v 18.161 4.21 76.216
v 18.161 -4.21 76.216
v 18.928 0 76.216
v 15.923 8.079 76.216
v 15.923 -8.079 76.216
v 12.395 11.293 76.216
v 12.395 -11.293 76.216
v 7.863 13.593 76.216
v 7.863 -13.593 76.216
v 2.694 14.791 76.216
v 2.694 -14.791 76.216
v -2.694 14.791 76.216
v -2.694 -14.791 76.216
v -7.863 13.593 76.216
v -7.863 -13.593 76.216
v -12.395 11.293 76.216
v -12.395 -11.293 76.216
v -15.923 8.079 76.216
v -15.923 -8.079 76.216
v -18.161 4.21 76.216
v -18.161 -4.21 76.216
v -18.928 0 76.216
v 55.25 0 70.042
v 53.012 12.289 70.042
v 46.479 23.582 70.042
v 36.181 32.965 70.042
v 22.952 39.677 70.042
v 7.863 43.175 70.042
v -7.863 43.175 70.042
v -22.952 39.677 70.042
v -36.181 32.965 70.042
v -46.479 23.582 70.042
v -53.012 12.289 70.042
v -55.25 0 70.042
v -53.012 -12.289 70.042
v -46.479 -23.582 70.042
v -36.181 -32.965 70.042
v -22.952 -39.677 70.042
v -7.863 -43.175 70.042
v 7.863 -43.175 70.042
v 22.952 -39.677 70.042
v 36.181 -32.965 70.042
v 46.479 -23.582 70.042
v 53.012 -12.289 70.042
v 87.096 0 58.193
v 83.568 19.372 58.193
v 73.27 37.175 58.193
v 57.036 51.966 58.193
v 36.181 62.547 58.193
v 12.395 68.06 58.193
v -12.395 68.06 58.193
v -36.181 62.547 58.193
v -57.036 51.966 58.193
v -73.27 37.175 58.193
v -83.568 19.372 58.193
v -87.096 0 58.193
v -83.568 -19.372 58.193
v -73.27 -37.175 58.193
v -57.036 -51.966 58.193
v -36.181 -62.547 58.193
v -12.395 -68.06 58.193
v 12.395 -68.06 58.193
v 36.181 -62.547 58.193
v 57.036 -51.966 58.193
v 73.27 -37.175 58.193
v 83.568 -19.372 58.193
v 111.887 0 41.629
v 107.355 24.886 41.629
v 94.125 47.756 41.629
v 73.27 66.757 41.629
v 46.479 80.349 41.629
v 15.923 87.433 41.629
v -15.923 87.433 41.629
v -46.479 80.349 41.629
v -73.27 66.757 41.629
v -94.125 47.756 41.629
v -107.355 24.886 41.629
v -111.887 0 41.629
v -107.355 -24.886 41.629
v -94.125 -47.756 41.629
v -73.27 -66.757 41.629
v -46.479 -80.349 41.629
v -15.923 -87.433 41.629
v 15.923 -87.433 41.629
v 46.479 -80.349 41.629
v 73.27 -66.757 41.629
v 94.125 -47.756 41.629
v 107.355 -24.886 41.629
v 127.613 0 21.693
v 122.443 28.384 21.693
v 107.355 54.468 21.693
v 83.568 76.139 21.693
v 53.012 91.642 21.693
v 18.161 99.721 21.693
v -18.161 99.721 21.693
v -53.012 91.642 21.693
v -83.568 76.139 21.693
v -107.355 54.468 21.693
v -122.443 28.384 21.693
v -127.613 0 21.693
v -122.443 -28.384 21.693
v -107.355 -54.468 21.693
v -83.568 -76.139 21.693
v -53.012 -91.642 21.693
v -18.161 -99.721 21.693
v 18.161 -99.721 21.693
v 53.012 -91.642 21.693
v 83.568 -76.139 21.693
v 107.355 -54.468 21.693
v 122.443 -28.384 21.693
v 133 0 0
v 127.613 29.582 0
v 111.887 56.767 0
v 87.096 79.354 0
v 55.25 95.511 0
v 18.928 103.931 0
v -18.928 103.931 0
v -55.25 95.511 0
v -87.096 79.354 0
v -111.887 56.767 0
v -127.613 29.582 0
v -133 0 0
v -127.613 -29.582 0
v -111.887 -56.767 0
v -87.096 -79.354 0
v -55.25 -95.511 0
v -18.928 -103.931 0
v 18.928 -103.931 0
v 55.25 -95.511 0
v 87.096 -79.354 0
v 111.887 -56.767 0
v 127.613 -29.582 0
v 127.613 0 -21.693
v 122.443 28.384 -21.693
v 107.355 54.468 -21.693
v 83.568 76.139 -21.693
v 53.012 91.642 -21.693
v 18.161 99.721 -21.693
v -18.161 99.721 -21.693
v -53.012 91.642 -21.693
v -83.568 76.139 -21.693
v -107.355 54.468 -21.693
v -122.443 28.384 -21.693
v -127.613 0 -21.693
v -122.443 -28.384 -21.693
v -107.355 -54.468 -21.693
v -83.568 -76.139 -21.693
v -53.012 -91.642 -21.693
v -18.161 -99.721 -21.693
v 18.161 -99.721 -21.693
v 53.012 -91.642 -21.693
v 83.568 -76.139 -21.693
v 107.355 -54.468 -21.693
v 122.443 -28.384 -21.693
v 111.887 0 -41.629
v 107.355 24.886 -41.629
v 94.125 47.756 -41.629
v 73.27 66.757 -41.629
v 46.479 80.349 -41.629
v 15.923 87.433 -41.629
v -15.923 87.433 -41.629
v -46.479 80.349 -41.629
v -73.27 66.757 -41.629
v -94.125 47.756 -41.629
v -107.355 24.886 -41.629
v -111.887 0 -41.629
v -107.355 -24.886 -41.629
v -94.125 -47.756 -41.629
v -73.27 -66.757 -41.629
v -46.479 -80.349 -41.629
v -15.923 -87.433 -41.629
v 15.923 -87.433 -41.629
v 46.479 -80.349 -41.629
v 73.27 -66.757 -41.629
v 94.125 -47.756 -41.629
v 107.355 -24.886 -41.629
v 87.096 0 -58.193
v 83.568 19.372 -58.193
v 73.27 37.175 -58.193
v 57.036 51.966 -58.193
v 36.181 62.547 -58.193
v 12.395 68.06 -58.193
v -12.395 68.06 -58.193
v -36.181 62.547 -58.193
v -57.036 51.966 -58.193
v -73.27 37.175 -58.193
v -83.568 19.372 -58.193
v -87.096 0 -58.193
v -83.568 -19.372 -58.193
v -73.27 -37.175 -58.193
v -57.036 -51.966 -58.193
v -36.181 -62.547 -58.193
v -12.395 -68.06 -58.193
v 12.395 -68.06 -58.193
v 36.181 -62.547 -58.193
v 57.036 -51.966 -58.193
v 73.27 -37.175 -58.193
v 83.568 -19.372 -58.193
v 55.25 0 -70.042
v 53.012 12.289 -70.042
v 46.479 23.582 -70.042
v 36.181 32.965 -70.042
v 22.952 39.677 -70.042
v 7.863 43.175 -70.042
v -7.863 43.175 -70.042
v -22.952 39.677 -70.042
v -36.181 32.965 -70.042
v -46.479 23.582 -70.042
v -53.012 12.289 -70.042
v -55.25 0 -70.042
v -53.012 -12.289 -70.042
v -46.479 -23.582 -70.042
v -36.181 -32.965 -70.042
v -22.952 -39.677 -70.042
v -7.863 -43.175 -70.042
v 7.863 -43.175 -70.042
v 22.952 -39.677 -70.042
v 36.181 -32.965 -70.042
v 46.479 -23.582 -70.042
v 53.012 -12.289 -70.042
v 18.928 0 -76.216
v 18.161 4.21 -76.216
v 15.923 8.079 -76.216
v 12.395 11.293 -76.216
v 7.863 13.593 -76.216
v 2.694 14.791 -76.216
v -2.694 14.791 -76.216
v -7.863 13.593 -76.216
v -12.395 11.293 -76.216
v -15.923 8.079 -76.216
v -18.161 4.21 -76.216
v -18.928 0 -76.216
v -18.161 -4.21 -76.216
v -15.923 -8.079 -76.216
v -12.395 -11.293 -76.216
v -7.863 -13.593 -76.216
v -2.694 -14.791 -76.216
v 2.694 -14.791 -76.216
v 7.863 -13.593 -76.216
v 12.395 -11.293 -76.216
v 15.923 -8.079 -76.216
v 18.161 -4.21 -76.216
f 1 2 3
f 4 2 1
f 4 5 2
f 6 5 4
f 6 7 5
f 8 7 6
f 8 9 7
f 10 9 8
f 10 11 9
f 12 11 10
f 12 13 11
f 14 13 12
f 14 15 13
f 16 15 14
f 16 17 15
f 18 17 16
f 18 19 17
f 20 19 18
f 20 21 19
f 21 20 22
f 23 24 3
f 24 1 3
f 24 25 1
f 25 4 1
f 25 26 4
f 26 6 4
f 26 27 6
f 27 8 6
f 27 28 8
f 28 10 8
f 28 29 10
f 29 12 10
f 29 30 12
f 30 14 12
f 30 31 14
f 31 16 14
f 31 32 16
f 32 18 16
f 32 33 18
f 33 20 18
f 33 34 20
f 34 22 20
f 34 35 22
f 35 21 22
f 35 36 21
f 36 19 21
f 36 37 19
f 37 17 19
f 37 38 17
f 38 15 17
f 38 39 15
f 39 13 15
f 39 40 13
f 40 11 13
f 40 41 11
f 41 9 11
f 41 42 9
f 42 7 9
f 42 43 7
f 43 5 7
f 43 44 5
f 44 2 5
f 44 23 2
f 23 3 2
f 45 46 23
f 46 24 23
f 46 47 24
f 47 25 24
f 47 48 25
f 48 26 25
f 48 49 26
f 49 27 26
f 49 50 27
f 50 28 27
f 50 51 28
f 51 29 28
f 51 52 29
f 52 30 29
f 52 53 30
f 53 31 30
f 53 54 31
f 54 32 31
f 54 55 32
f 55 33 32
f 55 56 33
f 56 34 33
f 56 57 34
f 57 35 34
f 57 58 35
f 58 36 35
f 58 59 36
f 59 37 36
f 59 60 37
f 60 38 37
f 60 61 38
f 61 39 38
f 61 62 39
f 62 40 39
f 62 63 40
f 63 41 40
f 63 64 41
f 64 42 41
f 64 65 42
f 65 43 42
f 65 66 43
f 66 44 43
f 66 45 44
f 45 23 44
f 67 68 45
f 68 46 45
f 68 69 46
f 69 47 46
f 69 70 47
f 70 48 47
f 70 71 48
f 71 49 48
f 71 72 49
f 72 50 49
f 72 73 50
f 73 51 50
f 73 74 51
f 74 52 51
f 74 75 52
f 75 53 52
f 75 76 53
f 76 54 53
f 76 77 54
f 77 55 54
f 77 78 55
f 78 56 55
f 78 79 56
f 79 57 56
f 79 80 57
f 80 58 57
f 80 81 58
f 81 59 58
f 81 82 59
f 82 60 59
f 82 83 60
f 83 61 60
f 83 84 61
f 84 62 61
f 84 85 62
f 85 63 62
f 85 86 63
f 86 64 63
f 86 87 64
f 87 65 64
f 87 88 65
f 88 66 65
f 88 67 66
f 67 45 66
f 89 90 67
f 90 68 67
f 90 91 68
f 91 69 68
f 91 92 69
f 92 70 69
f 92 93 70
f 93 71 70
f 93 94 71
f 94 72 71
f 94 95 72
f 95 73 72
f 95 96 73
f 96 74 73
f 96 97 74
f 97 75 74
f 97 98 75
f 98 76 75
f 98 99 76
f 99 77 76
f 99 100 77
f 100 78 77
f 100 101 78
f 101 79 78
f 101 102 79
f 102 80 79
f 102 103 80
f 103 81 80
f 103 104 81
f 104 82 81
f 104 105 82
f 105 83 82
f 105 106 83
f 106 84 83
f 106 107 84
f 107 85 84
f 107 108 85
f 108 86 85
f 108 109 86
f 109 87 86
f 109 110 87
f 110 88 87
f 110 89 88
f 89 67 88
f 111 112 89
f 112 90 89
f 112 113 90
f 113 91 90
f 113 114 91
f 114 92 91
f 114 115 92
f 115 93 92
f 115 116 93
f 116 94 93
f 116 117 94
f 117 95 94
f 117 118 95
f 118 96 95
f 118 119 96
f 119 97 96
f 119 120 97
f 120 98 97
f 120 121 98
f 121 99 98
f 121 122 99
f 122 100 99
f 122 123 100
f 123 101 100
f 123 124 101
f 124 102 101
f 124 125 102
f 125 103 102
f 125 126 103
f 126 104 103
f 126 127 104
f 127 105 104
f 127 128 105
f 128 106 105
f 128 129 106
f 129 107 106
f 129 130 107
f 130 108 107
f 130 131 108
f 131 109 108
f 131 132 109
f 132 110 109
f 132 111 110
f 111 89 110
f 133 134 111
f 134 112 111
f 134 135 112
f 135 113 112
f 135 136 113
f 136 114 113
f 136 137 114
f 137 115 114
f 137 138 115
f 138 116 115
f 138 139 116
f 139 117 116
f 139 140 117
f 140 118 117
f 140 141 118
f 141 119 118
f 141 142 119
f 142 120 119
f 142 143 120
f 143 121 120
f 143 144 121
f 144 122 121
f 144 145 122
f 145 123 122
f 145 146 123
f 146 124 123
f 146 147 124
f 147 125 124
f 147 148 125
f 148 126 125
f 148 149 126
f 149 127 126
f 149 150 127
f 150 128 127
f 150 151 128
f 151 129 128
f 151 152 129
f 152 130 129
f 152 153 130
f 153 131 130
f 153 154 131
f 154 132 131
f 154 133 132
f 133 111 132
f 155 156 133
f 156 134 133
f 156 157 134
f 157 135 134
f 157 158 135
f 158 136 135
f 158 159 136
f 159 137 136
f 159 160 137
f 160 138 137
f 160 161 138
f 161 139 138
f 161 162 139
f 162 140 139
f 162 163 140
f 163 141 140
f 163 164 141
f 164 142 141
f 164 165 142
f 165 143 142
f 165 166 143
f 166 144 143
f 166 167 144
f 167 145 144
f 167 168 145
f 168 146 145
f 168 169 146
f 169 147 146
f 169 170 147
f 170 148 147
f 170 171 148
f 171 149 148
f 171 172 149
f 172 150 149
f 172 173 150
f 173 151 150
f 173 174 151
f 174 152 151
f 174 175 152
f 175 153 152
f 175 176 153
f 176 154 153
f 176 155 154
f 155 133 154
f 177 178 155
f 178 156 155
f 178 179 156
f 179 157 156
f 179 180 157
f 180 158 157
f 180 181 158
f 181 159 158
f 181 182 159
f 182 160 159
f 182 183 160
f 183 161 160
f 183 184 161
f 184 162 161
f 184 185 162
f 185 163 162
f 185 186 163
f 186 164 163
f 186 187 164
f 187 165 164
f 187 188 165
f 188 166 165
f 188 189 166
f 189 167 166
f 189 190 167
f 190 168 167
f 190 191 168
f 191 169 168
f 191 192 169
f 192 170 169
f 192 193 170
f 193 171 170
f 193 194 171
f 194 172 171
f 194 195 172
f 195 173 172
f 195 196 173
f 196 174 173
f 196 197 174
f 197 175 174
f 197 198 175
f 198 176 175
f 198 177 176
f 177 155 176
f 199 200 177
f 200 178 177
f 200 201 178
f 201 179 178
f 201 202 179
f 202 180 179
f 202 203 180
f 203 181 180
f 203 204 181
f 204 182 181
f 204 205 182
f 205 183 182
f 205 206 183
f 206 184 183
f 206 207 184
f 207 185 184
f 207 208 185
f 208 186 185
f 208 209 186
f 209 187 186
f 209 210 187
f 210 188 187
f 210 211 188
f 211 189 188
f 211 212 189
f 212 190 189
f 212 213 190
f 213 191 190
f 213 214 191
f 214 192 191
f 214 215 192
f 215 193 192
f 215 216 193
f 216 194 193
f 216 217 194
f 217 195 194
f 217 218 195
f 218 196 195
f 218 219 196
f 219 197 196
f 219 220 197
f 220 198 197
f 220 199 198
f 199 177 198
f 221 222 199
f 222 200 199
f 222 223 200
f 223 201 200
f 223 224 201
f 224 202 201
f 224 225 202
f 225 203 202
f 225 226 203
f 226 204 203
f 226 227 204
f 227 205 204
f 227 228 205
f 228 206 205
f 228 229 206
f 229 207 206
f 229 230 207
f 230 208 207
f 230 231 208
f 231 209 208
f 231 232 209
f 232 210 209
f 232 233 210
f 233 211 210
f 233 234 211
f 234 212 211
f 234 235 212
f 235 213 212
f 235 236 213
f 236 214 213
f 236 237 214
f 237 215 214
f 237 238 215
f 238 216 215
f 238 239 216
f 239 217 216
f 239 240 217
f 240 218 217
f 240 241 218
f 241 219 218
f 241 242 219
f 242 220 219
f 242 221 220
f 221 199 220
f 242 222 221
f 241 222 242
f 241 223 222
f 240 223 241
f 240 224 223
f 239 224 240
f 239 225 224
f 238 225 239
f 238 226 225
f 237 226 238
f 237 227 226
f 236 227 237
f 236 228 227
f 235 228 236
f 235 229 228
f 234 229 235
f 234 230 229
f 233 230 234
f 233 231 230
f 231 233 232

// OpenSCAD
// Generated by SolidPython 1.0.1 on 2020-07-29 00:46:54


scale(v = [19, 15, 11]) {
	sphere(r = 7);
}
/***********************************************
*********      SolidPython code:      **********
************************************************
 
# import packages: SolidPython
from solid import *
from solid.utils import *
from itertools import chain, combinations, permutations


class Resize:

    def __init__(self, scad_file):
        self.scad_file = scad_file
        #self.scad_file = import_scad(scad_file)
        # cone/cylinder param:
        self.r1 = 0
        self.r2 = 0
        self.h = 0
        # rectangular prism param:
        self.w = 0
        self.l = 0
        # ellipse param:
        self.r = 0

    # import OpenScad code (file name corresponds to shape)


    # classify shape + parameters
    def assign(self, param1, param2, param3):
        if self.scad_file == 'cone.scad':
            self.r1 = param1
            self.r2 = param2
            self.h = param3
        elif self.scad_file == 'cylinder.scad':
            self.r1 = param1
            self.r2 = param2
            self.h = param3
        elif self.scad_file == 'rectangularPrism.scad':
            self.h = param1
            self.l = param2
            self.w = param3
        else:
            self.r = param1
            self.h = param2

    # resize parameters
    def iterate(self):
        x = range(3, 20, 2)
        i = 1
        if self.scad_file == 'cone.scad':
            tempList = list(permutations(x, 2))
            for temp in tempList:
                param1 = temp[0]
                param2 = temp[1]
                filepath = 'produced_scad_files/' + 'cone' + str(param1) + '_' + str(param2) + '_' + '.scad'
                scad_render_to_file(cylinder(h=param1, r1=param2, r2=0), filepath)

        elif self.scad_file == 'cylinder.scad':
            tempList = list(permutations(x, 3))
            for temp in tempList:
                param1 = temp[0]
                param2 = temp[1]
                filepath = 'produced_scad_files/' + 'cylinder' + str(param1) + '_' + str(param2) + '_' + '.scad'
                scad_render_to_file(cylinder(h=param1, r1=param2, r2=param2), filepath)

        elif self.scad_file == 'rectangularPrism.scad':
            tempList = list(permutations(x, 3))
            for temp in tempList:
                param1 = temp[0]
                param2 = temp[1]
                param3 = temp[2]
                filepath = 'produced_scad_files/' + 'rectangularPrism' + str(param1) + '_' + str(param2) + '_' + str(
                    param3) + '.scad'
                scad_render_to_file(cube(size=(param1, param2, param3)), filepath)

        elif self.scad_file == 'ellipse.scad':
            tempList = list(permutations(x, 4))
            for temp in tempList:
                param1 = temp[0]
                param2 = temp[1]
                param3 = temp[2]
                param4 = temp[3]
                filepath = 'produced_scad_files/' + 'ellipse' + str(param1) + '_' + str(param2) + '_' + str(param3) + '_' + str(param4) + '.scad'
                scad_render_to_file(scale([param1, param2, param3])(sphere(r=param4)), filepath)

    def render_to_scadfile(self):
        scad_render_to_file(scad, 'example.scad') 
 
************************************************/
